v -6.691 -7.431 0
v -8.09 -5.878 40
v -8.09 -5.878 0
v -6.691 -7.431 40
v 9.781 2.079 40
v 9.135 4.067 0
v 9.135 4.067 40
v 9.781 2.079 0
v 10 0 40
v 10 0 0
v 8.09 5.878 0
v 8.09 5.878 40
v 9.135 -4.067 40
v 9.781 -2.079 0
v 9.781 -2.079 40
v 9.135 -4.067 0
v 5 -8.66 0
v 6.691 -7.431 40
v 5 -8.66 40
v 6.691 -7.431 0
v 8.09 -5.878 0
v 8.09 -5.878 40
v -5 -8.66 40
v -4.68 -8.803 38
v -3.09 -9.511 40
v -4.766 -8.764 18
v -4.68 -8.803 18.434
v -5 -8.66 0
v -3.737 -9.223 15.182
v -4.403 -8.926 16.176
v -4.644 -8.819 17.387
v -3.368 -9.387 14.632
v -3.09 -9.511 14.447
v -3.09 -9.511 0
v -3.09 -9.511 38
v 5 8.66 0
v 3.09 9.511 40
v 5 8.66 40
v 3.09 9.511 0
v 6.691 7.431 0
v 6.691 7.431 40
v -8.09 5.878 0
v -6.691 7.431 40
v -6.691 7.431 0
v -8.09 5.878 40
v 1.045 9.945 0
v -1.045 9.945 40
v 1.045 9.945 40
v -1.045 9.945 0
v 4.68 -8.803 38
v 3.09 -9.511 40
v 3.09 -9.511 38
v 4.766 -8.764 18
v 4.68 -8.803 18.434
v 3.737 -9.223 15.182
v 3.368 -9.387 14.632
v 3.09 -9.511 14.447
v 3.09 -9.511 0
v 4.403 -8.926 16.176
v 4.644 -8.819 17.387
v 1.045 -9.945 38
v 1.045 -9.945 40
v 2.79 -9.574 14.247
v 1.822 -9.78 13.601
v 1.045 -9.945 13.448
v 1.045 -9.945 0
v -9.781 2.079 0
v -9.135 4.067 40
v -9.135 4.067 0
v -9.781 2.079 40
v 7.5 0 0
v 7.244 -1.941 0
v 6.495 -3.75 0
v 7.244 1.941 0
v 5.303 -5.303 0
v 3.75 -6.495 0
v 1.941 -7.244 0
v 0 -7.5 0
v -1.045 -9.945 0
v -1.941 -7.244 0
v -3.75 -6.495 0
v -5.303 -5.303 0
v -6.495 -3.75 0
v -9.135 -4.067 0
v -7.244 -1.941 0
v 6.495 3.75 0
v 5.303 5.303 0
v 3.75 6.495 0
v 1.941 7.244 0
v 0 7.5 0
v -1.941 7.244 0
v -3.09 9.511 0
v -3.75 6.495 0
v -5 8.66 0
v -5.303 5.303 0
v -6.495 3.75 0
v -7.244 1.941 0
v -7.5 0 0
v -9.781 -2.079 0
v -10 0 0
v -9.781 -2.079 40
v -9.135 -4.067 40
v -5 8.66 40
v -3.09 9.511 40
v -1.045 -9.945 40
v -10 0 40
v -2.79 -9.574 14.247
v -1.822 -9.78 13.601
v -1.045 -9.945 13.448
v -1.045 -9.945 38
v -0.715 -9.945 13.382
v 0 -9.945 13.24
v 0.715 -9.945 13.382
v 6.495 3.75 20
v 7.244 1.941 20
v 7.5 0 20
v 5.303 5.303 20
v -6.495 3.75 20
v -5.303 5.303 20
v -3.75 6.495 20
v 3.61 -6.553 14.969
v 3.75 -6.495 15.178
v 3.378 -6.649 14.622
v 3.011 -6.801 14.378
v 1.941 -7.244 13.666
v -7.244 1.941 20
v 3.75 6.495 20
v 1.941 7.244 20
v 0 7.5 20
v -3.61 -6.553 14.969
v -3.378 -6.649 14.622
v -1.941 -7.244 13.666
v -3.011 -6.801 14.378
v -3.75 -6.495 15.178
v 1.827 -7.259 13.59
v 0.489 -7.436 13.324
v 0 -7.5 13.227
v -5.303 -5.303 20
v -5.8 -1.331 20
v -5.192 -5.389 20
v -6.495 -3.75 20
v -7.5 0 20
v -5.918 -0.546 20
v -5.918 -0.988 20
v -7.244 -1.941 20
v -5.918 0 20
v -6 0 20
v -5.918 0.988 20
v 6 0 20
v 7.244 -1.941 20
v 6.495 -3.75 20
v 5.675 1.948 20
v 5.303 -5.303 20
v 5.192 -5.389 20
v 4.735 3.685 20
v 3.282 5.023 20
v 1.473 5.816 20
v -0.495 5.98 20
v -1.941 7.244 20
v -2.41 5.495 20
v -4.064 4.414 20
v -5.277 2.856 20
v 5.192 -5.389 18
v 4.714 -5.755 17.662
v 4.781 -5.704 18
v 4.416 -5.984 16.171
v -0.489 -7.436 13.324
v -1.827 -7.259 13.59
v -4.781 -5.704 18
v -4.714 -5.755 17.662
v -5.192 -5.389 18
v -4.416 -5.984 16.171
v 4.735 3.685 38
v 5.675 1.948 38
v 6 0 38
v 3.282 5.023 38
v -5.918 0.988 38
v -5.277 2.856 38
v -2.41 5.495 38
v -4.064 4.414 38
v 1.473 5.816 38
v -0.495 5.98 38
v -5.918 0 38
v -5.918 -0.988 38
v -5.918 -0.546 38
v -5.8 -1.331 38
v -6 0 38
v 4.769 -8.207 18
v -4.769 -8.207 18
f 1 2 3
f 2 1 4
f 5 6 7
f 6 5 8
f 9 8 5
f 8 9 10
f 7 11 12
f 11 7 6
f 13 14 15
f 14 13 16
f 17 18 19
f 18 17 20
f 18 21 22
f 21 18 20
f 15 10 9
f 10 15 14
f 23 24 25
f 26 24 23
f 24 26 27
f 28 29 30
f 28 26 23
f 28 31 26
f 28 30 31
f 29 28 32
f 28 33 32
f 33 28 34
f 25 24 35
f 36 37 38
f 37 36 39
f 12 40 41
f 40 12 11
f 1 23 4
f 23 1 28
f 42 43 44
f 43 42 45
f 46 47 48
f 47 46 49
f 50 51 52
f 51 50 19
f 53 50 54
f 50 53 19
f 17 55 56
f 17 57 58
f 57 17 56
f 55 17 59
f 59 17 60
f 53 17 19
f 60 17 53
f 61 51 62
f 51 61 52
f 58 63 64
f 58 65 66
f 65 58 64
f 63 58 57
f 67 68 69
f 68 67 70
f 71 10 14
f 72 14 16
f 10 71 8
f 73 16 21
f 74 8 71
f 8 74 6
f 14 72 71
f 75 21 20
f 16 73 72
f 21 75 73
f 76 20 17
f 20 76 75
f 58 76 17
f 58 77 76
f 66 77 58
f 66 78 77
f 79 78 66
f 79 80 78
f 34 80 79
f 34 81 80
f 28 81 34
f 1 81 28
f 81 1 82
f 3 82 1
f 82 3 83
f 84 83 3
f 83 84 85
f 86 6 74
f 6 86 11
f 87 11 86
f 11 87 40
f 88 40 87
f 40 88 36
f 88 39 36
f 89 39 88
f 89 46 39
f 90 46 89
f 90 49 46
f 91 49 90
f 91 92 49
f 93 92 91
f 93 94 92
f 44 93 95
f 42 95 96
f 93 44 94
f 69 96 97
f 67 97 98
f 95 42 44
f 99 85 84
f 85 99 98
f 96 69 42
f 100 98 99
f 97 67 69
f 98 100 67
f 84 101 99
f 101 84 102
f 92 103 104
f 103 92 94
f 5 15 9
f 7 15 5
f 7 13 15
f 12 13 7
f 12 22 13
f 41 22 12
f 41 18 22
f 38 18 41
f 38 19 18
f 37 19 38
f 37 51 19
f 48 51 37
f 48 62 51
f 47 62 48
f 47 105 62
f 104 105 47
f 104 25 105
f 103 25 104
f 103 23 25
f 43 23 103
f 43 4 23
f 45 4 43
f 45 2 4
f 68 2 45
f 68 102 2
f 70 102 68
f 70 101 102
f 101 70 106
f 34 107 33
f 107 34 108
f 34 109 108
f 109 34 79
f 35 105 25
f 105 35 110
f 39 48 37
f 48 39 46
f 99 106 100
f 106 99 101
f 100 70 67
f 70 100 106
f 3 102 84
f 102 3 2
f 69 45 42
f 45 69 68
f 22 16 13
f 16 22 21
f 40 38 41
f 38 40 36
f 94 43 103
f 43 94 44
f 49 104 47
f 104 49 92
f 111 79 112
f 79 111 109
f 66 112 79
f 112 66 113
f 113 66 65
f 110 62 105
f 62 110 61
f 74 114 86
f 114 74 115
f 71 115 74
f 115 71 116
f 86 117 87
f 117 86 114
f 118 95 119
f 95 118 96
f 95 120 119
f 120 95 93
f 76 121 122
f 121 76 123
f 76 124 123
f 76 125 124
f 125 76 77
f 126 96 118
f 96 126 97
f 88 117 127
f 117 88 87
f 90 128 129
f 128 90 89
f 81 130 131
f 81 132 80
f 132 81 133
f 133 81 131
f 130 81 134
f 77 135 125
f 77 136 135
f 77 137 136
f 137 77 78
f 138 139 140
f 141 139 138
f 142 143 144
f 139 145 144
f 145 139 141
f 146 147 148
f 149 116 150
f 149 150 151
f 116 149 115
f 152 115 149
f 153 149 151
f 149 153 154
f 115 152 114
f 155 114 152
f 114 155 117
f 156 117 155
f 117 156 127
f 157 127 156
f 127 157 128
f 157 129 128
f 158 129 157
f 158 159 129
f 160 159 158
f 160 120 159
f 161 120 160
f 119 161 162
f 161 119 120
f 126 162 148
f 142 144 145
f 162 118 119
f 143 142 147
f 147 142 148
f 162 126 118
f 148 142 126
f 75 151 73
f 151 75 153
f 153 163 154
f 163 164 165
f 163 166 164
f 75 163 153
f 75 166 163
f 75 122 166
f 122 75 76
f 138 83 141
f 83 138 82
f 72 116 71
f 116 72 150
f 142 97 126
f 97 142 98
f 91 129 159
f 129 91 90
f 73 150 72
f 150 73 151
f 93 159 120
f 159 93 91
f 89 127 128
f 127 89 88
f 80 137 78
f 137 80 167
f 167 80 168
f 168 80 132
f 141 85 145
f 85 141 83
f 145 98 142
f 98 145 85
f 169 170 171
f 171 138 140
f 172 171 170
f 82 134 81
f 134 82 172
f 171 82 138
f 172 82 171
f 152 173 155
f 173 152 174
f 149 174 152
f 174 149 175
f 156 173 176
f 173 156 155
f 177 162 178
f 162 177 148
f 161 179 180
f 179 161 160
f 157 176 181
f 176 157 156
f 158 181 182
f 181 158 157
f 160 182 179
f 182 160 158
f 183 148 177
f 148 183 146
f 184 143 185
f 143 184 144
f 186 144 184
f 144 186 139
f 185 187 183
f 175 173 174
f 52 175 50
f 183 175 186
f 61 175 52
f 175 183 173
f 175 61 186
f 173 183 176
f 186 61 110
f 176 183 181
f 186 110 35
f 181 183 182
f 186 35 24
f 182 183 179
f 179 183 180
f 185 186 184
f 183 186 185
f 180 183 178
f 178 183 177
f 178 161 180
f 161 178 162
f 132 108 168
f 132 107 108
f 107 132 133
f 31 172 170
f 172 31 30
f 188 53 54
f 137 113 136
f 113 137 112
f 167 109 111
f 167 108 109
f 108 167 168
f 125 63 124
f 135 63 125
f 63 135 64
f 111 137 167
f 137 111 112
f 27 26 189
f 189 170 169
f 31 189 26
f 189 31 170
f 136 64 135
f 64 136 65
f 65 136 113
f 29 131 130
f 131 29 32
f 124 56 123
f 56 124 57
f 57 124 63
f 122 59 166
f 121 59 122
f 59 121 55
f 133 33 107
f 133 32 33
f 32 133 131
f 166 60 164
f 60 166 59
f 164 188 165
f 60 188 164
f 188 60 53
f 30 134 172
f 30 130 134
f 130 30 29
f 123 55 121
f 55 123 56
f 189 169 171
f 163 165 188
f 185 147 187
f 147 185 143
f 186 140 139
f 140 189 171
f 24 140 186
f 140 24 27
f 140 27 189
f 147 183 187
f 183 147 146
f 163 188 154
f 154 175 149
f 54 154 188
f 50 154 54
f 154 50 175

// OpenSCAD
/*difference(){
cylinder(16, 7,7);
  cylinder(16, 7.3/2,7.3/2);}
*/ 

path_pts = [
    [-6, 0],
    [6, 0],
    [0, 40]
];
  
  
difference(){
 cylinder(40, 10,10);
  cylinder(20, 7.5,7.5);
    cylinder(38, 6,6);
    translate([0,-2,18]) rotate([90,0,0]) cylinder(20, 4.8,4.7);
    rotate([0,0,180]) translate([0,0,18]) linear_extrude(20) polygon(path_pts);}
    
